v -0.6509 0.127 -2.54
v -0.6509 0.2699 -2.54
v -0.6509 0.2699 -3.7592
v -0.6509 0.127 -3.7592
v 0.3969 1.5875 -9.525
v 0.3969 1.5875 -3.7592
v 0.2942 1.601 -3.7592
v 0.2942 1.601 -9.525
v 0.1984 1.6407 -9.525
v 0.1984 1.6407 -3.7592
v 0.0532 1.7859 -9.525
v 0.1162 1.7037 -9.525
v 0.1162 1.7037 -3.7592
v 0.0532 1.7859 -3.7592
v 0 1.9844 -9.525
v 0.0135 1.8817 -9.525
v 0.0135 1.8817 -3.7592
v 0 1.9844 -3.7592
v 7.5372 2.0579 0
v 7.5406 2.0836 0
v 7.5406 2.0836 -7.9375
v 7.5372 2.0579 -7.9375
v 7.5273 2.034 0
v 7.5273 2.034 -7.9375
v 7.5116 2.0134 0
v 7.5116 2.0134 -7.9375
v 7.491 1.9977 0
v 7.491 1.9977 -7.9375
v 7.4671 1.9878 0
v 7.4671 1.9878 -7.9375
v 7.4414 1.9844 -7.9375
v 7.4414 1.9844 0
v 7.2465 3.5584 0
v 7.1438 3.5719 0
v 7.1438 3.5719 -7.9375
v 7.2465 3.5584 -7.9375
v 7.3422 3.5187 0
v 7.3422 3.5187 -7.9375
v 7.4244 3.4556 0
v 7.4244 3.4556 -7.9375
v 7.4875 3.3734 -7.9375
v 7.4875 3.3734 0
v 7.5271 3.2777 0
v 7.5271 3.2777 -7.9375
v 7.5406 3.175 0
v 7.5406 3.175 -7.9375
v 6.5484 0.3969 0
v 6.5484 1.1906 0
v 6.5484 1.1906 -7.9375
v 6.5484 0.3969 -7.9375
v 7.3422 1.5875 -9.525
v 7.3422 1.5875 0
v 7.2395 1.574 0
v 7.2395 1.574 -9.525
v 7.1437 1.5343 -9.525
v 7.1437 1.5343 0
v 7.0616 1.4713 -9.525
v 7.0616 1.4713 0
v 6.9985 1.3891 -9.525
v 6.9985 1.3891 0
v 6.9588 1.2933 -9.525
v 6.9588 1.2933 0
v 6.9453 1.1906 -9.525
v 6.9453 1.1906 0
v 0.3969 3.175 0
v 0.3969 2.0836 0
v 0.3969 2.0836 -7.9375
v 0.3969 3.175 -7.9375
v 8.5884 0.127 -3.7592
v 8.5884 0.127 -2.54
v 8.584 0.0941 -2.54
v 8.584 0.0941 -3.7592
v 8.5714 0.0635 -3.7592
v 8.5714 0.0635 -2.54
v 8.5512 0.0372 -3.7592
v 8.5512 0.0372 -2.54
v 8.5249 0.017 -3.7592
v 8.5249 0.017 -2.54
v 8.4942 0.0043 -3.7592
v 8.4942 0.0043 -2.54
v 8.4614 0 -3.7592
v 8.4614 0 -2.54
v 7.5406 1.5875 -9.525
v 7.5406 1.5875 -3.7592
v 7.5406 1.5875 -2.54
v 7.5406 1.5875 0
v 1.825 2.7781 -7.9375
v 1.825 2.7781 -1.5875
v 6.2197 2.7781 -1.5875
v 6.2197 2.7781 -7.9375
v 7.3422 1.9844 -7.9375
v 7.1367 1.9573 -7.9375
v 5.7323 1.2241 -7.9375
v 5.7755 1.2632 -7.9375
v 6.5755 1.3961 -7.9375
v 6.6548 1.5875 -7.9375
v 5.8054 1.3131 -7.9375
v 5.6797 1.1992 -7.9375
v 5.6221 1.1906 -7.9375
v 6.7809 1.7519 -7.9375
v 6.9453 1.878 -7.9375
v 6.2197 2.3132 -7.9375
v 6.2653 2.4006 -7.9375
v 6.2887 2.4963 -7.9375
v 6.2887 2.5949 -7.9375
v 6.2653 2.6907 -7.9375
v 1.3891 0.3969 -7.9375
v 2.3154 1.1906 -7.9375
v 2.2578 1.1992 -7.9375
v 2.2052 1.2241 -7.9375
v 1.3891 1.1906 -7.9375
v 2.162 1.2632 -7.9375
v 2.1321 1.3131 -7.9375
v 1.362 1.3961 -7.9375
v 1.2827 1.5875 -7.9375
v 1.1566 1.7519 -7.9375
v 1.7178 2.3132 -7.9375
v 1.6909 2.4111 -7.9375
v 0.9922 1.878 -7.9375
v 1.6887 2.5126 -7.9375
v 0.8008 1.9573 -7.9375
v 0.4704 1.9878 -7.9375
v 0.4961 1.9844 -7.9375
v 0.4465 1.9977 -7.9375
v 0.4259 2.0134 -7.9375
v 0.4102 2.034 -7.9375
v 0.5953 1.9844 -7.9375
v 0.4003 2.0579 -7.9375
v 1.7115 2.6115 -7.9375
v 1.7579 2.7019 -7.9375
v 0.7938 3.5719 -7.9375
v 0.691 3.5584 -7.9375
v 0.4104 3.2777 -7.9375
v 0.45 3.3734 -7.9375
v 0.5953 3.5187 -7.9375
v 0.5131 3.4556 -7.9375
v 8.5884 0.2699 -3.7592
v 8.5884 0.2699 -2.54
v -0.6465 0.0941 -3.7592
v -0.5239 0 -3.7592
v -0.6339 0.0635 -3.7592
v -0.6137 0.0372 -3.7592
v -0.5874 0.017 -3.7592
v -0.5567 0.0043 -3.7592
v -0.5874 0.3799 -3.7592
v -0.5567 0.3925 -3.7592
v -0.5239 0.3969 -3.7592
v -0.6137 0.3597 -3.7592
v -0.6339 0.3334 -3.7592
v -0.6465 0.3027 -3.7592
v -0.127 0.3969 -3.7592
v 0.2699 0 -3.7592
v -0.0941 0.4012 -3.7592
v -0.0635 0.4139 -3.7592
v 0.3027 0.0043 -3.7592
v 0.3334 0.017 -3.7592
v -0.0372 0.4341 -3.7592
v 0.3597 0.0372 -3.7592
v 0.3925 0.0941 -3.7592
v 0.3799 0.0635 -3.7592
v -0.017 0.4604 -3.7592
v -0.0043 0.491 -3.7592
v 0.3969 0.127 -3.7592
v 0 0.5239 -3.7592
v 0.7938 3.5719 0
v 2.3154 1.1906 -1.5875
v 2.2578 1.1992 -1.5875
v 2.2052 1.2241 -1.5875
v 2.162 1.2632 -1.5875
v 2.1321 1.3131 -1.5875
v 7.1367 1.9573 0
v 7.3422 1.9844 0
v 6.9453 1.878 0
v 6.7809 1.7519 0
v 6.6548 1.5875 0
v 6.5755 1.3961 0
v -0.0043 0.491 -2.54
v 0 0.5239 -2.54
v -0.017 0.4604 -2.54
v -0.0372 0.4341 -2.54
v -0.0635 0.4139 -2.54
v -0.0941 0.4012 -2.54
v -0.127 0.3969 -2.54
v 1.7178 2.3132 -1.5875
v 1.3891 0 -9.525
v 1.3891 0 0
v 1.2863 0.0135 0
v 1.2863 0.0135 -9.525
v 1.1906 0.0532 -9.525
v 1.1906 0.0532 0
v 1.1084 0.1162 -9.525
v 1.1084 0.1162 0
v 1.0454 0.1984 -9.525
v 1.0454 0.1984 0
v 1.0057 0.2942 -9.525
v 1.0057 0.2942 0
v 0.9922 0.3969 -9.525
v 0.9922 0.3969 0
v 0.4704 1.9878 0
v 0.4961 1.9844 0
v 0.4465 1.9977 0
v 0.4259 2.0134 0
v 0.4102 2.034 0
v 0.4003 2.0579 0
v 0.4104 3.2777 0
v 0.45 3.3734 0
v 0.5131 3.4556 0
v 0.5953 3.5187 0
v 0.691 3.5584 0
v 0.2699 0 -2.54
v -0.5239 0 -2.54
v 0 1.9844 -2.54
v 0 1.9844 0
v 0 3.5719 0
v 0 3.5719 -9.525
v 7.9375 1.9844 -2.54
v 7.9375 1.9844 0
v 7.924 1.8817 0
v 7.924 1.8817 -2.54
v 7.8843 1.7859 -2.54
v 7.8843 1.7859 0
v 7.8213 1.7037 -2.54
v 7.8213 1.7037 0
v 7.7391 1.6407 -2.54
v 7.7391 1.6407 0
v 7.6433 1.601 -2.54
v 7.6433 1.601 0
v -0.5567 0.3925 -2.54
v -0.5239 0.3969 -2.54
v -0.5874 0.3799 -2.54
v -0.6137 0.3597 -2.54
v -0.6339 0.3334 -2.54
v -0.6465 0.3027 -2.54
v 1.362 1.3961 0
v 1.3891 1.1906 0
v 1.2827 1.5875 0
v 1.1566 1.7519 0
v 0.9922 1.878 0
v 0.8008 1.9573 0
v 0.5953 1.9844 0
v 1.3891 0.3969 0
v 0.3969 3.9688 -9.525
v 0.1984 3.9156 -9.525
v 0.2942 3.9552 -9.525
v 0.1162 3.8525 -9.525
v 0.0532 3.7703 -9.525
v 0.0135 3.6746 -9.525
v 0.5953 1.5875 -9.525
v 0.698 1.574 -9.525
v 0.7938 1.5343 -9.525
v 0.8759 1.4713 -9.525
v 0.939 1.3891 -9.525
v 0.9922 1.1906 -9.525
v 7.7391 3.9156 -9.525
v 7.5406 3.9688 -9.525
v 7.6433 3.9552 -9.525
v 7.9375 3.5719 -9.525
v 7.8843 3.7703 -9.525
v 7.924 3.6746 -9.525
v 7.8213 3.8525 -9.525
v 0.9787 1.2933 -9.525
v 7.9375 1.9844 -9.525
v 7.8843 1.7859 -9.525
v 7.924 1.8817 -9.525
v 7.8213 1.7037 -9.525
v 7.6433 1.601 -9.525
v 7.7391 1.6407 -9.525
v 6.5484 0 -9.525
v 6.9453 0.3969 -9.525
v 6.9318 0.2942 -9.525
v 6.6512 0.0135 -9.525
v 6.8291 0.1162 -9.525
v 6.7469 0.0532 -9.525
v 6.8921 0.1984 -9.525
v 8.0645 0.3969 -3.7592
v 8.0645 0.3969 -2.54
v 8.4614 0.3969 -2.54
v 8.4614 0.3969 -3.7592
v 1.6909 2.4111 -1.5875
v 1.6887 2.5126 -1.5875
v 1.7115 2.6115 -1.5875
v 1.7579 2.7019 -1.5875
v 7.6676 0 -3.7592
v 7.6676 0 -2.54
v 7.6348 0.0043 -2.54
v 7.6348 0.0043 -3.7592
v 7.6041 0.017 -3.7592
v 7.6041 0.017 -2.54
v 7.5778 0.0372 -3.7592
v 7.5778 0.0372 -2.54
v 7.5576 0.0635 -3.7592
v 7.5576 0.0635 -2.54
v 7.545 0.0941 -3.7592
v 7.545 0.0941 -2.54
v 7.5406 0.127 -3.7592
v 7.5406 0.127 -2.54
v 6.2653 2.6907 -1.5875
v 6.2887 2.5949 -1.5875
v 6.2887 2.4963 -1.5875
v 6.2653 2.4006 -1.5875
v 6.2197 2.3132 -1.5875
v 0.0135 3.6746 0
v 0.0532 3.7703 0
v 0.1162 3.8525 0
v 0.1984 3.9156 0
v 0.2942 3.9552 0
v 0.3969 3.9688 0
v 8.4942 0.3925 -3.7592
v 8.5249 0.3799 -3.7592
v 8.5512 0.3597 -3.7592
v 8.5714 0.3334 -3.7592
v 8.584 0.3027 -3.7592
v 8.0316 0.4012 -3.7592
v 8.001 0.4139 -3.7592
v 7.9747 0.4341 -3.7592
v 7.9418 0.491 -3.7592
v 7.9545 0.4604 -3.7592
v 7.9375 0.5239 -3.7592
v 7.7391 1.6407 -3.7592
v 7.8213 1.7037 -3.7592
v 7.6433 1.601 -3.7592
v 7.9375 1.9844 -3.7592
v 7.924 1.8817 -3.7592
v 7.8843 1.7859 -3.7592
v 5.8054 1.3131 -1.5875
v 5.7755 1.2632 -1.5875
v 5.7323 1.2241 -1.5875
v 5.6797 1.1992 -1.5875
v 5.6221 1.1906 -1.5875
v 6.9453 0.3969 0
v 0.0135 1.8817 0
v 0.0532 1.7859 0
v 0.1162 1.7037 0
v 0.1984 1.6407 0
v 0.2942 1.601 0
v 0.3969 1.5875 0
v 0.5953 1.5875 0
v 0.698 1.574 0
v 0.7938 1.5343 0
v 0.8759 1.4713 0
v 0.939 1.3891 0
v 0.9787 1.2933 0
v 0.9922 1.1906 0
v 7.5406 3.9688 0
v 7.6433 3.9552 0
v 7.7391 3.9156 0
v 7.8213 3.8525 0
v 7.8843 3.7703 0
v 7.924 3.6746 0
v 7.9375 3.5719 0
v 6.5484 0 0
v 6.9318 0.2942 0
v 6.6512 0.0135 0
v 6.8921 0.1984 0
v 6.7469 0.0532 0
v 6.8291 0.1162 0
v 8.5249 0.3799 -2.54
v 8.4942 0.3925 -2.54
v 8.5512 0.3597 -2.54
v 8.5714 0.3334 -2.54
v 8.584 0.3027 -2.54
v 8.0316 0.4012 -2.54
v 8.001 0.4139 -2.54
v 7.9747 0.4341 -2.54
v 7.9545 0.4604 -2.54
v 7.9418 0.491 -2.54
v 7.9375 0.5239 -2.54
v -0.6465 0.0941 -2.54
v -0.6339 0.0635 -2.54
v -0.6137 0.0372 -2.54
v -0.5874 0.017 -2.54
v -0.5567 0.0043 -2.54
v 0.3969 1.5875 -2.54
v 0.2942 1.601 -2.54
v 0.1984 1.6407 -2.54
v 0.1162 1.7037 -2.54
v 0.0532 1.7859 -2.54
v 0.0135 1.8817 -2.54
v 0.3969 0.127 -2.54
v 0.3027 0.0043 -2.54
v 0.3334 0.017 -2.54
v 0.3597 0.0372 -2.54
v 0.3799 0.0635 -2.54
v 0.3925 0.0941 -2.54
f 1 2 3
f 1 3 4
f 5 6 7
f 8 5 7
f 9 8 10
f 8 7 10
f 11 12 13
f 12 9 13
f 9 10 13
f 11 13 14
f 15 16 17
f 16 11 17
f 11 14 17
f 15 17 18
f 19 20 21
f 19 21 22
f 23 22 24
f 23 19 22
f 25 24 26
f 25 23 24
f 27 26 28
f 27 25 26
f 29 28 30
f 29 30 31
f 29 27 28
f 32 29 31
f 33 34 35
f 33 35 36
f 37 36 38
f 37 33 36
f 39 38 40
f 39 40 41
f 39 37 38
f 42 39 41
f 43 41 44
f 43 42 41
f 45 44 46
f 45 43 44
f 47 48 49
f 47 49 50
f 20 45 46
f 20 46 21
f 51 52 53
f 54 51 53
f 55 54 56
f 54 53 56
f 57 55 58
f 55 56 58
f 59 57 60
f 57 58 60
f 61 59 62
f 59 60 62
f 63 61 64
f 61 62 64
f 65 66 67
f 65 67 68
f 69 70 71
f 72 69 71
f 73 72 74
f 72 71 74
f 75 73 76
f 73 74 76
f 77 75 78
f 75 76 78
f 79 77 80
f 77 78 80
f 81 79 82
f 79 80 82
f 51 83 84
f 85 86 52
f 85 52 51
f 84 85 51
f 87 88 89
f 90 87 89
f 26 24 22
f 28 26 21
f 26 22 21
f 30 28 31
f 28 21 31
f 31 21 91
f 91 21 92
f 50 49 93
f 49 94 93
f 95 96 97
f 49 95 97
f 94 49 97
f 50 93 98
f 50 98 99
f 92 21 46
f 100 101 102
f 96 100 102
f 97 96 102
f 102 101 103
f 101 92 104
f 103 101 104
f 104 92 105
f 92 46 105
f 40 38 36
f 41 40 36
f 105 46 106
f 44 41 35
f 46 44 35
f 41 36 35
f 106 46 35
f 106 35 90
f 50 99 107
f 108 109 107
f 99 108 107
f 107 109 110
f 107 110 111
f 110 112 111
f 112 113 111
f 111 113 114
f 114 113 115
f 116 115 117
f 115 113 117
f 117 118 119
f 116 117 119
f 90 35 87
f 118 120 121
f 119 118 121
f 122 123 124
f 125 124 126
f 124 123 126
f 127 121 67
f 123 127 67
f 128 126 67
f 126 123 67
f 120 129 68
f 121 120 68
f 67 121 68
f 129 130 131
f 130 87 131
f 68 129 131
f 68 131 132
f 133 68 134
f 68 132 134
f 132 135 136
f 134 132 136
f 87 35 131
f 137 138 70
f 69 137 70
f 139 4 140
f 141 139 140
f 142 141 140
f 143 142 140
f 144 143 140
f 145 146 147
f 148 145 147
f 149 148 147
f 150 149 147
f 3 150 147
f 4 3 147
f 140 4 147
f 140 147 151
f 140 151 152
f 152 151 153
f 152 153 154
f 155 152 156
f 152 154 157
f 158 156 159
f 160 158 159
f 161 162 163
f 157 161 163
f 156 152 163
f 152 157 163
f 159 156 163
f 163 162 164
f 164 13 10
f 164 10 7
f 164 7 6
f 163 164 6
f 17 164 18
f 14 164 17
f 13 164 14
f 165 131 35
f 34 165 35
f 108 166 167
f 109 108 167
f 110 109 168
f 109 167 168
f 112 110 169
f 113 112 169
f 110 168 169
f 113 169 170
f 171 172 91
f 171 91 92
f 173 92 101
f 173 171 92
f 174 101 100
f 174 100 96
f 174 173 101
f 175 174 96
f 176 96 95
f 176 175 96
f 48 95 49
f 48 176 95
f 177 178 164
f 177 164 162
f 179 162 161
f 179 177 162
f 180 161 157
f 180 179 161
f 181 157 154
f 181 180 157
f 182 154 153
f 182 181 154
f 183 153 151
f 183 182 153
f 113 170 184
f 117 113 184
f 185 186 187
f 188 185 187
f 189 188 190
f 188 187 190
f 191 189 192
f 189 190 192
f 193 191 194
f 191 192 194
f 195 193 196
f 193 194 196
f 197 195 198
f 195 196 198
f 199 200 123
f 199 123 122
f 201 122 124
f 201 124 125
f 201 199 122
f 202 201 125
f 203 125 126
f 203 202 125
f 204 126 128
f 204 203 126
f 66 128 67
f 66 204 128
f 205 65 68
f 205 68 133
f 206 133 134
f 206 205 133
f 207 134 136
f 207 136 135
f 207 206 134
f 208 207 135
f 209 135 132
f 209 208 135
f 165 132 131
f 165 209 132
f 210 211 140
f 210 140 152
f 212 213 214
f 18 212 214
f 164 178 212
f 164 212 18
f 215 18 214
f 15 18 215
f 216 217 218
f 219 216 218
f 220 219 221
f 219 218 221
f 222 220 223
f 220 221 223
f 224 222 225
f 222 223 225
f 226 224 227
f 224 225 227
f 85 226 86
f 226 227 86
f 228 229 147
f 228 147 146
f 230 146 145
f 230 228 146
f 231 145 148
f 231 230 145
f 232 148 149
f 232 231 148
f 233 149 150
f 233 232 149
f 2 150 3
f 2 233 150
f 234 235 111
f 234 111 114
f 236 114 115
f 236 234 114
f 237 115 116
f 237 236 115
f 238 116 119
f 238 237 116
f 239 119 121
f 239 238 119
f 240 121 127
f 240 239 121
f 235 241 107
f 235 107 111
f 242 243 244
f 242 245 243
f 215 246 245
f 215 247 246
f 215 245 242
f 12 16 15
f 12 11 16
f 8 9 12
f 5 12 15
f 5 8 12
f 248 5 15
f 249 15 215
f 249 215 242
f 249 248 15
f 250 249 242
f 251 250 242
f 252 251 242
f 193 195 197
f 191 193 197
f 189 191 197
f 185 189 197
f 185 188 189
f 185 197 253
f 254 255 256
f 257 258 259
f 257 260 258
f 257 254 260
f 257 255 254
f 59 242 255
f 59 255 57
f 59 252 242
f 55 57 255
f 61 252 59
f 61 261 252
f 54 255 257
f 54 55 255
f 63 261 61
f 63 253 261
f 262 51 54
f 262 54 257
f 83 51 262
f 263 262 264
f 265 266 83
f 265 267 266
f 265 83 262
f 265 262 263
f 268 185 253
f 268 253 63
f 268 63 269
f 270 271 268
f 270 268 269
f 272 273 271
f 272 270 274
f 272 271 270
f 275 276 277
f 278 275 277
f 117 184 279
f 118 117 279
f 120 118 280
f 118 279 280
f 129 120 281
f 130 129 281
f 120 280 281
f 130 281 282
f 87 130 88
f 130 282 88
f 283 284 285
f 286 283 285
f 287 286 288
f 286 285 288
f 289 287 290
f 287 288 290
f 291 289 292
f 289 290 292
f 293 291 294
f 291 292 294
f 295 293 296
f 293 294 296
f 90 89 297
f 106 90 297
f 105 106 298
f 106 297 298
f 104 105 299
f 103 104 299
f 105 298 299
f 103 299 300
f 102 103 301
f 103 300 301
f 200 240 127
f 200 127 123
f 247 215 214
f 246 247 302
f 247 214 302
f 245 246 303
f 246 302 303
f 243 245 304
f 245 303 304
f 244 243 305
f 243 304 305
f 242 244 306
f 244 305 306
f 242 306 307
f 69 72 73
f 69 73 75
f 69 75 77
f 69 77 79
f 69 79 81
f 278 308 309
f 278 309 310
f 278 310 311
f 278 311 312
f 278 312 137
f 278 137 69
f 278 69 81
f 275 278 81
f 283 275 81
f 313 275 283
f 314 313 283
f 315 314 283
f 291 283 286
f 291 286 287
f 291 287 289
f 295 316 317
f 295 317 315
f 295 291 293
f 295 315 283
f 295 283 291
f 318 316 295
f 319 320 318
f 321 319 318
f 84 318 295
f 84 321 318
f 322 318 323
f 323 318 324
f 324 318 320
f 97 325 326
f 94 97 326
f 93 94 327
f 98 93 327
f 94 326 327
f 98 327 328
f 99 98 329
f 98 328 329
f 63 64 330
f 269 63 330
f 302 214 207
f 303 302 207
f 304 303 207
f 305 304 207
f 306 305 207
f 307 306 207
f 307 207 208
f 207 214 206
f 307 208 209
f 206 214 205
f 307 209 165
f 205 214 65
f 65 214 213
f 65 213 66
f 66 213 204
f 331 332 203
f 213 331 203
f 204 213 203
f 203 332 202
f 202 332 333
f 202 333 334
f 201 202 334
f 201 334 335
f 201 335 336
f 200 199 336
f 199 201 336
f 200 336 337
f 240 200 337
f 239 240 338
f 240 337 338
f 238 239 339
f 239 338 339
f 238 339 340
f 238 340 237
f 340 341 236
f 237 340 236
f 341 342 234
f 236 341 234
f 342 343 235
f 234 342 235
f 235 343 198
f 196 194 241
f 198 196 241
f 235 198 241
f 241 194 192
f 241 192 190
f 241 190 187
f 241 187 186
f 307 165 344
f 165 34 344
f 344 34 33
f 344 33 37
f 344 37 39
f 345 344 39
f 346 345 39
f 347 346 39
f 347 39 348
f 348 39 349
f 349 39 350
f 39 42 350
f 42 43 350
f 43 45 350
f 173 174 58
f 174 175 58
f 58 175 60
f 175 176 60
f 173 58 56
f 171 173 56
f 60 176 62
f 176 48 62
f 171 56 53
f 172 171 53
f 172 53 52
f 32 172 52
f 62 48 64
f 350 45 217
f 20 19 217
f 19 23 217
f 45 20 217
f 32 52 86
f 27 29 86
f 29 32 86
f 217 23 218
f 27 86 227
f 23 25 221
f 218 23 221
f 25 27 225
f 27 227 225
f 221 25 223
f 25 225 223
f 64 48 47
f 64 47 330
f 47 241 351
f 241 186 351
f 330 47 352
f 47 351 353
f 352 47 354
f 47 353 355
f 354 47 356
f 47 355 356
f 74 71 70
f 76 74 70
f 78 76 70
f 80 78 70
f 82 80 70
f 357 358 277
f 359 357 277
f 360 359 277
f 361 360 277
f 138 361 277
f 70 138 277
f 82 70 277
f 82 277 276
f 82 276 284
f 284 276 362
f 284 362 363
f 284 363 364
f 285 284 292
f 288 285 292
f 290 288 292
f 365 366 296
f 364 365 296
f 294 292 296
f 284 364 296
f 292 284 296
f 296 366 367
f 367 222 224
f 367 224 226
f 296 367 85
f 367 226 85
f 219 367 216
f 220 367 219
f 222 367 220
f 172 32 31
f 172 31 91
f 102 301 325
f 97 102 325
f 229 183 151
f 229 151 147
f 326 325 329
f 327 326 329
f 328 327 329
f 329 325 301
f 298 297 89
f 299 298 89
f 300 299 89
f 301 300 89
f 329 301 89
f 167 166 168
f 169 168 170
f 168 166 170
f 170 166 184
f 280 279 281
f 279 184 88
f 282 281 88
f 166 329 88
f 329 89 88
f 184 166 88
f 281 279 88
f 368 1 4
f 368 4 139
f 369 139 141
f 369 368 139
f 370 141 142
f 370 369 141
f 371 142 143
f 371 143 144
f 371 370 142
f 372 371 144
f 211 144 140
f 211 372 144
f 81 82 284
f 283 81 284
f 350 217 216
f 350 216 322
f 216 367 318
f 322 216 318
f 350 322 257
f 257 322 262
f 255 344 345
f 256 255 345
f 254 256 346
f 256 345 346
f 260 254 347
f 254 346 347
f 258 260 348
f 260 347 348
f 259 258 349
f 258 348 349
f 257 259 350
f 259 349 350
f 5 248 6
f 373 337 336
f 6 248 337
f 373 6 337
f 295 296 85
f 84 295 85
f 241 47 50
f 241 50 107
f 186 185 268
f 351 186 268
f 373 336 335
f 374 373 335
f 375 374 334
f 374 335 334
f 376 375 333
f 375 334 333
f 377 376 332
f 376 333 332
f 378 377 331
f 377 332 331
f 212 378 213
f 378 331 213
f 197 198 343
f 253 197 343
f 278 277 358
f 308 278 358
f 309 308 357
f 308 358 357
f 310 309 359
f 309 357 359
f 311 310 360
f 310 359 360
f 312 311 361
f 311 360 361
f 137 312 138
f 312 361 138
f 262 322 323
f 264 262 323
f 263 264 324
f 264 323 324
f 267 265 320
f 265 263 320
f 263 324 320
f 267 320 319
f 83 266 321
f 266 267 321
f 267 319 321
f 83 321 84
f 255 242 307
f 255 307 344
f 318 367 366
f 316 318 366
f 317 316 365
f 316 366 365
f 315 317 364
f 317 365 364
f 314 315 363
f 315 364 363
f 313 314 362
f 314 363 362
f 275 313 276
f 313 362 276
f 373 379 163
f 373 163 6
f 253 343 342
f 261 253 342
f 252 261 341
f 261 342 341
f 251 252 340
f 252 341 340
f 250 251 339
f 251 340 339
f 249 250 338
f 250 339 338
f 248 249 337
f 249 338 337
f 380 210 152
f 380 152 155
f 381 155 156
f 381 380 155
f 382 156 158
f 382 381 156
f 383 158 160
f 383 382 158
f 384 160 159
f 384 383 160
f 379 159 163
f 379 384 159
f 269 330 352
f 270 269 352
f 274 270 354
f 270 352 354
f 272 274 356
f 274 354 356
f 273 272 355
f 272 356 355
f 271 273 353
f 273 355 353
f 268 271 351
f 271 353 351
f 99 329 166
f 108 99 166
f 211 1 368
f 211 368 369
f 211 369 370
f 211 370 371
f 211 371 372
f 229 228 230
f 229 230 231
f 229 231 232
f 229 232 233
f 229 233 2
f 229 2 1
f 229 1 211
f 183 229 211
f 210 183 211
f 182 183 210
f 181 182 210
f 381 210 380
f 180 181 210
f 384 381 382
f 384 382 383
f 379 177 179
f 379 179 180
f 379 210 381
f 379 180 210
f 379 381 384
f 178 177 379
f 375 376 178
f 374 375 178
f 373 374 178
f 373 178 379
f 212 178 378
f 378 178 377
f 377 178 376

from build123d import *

# Parameters (mm, degrees)
SKETCH1_W           = 7.9375
SKETCH1_H           = 9.525
EXTRUDE1_DEPTH      = 3.96875
SKETCH2_OUTSIDE_W   = 12.541
SKETCH2_OUTSIDE_H   = 8.573
EXTRUDE2_DEPTH      = 14.018467952
EXTRUDE3_DEPTH      = 1.5875
EXTRUDE4_DEPTH      = 6.35
BOSS_EXTRUDE1_START = -2.54
BOSS_EXTRUDE1_DEPTH = 1.2192


with BuildPart() as part:
    # Sketch1 → Extrude1 (new body)
    with BuildSketch(Plane(origin=(0, 0, 0), x_dir=(1, 0, 0), z_dir=(0, 1, 0))):
        with Locations((3.96875, 4.7625)):
            Rectangle(SKETCH1_W, SKETCH1_H)
    extrude(amount=EXTRUDE1_DEPTH)

    # Sketch2 outside → Extrude2 (cut, through all)
    with BuildSketch(Plane.XY):
        with Locations((3.9685, 1.9845)):
            Rectangle(SKETCH2_OUTSIDE_W, SKETCH2_OUTSIDE_H)
        with BuildLine():
            Line((0, 1.984375), (0, 3.571875))
            ThreePointArc((0, 3.571875), (0.116241996, 3.852508004), (0.396875, 3.96875))
            Line((0.396875, 3.96875), (7.540625, 3.96875))
            ThreePointArc((7.540625, 3.96875), (7.821258004, 3.852508004), (7.9375, 3.571875))
            Line((7.9375, 3.571875), (7.9375, 1.984375))
            ThreePointArc((7.9375, 1.984375), (7.821258004, 1.703741996), (7.540625, 1.5875))
            Line((7.540625, 1.5875), (7.3421875, 1.5875))
            ThreePointArc((7.3421875, 1.5875), (7.061554496, 1.471258004), (6.9453125, 1.190625))
            Line((6.9453125, 1.190625), (6.9453125, 0.396875))
            ThreePointArc((6.9453125, 0.396875), (6.829070504, 0.116241996), (6.5484375, 0))
            Line((6.5484375, 0), (1.3890625, 0))
            ThreePointArc((1.3890625, 0), (1.108429496, 0.116241996), (0.9921875, 0.396875))
            Line((0.9921875, 0.396875), (0.9921875, 1.190625))
            ThreePointArc((0.9921875, 1.190625), (0.875945504, 1.471258004), (0.5953125, 1.5875))
            Line((0.5953125, 1.5875), (0.396875, 1.5875))
            ThreePointArc((0.396875, 1.5875), (0.116241996, 1.703741996), (0, 1.984375))
        make_face(mode=Mode.SUBTRACT)
    extrude(amount=-EXTRUDE2_DEPTH, mode=Mode.SUBTRACT)

    # Sketch3 → Extrude3 (cut)
    with BuildSketch(Plane.XY):
        with BuildLine():
            ThreePointArc((1.3890625, 1.190625), (1.156578508, 1.751891008), (0.5953125, 1.984375))
            Line((0.5953125, 1.984375), (0.49609375, 1.984375))
            ThreePointArc((0.49609375, 1.984375), (0.425935499, 2.013435499), (0.396875, 2.08359375))
            Line((0.396875, 2.08359375), (0.396875, 3.175))
            ThreePointArc((0.396875, 3.175), (0.513116996, 3.455633004), (0.79375, 3.571875))
            Line((0.79375, 3.571875), (7.14375, 3.571875))
            ThreePointArc((7.14375, 3.571875), (7.424383004, 3.455633004), (7.540625, 3.175))
            Line((7.540625, 3.175), (7.540625, 2.08359375))
            ThreePointArc((7.540625, 2.08359375), (7.511564501, 2.013435499), (7.44140625, 1.984375))
            Line((7.44140625, 1.984375), (7.3421875, 1.984375))
            ThreePointArc((7.3421875, 1.984375), (6.780921492, 1.751891008), (6.5484375, 1.190625))
            Line((6.5484375, 1.190625), (6.5484375, 0.396875))
            Line((6.5484375, 0.396875), (1.3890625, 0.396875))
            Line((1.3890625, 0.396875), (1.3890625, 1.190625))
        make_face()
    extrude(amount=-EXTRUDE3_DEPTH, mode=Mode.SUBTRACT)

    # Sketch5 → Extrude4 (cut)
    with BuildSketch(Plane.XY.offset(-1.5875)):
        with BuildLine():
            Line((0.79375, 3.571875), (7.14375, 3.571875))
            ThreePointArc((7.14375, 3.571875), (7.424383004, 3.455633004), (7.540625, 3.175))
            Line((7.540625, 3.175), (7.540625, 2.08359375))
            ThreePointArc((7.540625, 2.08359375), (7.511564501, 2.013435499), (7.44140625, 1.984375))
            Line((7.44140625, 1.984375), (7.3421875, 1.984375))
            ThreePointArc((7.3421875, 1.984375), (6.780921492, 1.751891008), (6.5484375, 1.190625))
            Line((6.5484375, 1.190625), (6.5484375, 0.396875))
            Line((6.5484375, 0.396875), (1.3890625, 0.396875))
            Line((1.3890625, 0.396875), (1.3890625, 1.190625))
            ThreePointArc((1.3890625, 1.190625), (1.156578508, 1.751891008), (0.5953125, 1.984375))
            Line((0.5953125, 1.984375), (0.49609375, 1.984375))
            ThreePointArc((0.49609375, 1.984375), (0.425935499, 2.013435499), (0.396875, 2.08359375))
            Line((0.396875, 2.08359375), (0.396875, 3.175))
            ThreePointArc((0.396875, 3.175), (0.513116996, 3.455633004), (0.79375, 3.571875))
        make_face()
        with BuildLine():
            Line((1.824986809, 2.778125), (6.219655485, 2.778125))
            ThreePointArc((6.219655485, 2.778125), (6.29171032, 2.545641008), (6.219655485, 2.313157015))
            Line((6.219655485, 2.313157015), (5.805428146, 1.313123756))
            ThreePointArc((5.805428146, 1.313123756), (5.73234177, 1.224067749), (5.622095802, 1.190625))
            Line((5.622095802, 1.190625), (2.315404198, 1.190625))
            ThreePointArc((2.315404198, 1.190625), (2.20515823, 1.224067749), (2.132071854, 1.313123756))
            Line((2.132071854, 1.313123756), (1.717844515, 2.313157015))
            ThreePointArc((1.717844515, 2.313157015), (1.697050338, 2.562776965), (1.824986809, 2.778125))
        make_face(mode=Mode.SUBTRACT)
    extrude(amount=-EXTRUDE4_DEPTH, mode=Mode.SUBTRACT)

    # Sketch6 → Boss-Extrude1 (add)
    with BuildSketch(Plane.XY.offset(BOSS_EXTRUDE1_START)):
        with BuildLine():
            Line((0, 3.139540901), (0, 0.523875))
            ThreePointArc((0, 0.523875), (-0.037197439, 0.434072439), (-0.127, 0.396875))
            Line((-0.127, 0.396875), (-0.523875, 0.396875))
            ThreePointArc((-0.523875, 0.396875), (-0.613677561, 0.359677561), (-0.650875, 0.269875))
            Line((-0.650875, 0.269875), (-0.650875, 0.127))
            ThreePointArc((-0.650875, 0.127), (-0.613677561, 0.037197439), (-0.523875, 0))
            Line((-0.523875, 0), (0.269875, 0))
            ThreePointArc((0.269875, 0), (0.359677561, 0.037197439), (0.396875, 0.127))
            Line((0.396875, 0.127), (0.396875, 3.139540901))
            Line((0.396875, 3.139540901), (0, 3.139540901))
        make_face()
        with BuildLine():
            Line((7.540625, 3.139540901), (7.9375, 3.139540901))
            Line((7.9375, 3.139540901), (7.9375, 0.523875))
            ThreePointArc((7.9375, 0.523875), (7.974697439, 0.434072439), (8.0645, 0.396875))
            Line((8.0645, 0.396875), (8.461375, 0.396875))
            ThreePointArc((8.461375, 0.396875), (8.551177561, 0.359677561), (8.588375, 0.269875))
            Line((8.588375, 0.269875), (8.588375, 0.127))
            ThreePointArc((8.588375, 0.127), (8.551177561, 0.037197439), (8.461375, 0))
            Line((8.461375, 0), (7.667625, 0))
            ThreePointArc((7.667625, 0), (7.577822439, 0.037197439), (7.540625, 0.127))
            Line((7.540625, 0.127), (7.540625, 3.139540901))
        make_face()
    extrude(amount=-BOSS_EXTRUDE1_DEPTH)


solid = part.part
